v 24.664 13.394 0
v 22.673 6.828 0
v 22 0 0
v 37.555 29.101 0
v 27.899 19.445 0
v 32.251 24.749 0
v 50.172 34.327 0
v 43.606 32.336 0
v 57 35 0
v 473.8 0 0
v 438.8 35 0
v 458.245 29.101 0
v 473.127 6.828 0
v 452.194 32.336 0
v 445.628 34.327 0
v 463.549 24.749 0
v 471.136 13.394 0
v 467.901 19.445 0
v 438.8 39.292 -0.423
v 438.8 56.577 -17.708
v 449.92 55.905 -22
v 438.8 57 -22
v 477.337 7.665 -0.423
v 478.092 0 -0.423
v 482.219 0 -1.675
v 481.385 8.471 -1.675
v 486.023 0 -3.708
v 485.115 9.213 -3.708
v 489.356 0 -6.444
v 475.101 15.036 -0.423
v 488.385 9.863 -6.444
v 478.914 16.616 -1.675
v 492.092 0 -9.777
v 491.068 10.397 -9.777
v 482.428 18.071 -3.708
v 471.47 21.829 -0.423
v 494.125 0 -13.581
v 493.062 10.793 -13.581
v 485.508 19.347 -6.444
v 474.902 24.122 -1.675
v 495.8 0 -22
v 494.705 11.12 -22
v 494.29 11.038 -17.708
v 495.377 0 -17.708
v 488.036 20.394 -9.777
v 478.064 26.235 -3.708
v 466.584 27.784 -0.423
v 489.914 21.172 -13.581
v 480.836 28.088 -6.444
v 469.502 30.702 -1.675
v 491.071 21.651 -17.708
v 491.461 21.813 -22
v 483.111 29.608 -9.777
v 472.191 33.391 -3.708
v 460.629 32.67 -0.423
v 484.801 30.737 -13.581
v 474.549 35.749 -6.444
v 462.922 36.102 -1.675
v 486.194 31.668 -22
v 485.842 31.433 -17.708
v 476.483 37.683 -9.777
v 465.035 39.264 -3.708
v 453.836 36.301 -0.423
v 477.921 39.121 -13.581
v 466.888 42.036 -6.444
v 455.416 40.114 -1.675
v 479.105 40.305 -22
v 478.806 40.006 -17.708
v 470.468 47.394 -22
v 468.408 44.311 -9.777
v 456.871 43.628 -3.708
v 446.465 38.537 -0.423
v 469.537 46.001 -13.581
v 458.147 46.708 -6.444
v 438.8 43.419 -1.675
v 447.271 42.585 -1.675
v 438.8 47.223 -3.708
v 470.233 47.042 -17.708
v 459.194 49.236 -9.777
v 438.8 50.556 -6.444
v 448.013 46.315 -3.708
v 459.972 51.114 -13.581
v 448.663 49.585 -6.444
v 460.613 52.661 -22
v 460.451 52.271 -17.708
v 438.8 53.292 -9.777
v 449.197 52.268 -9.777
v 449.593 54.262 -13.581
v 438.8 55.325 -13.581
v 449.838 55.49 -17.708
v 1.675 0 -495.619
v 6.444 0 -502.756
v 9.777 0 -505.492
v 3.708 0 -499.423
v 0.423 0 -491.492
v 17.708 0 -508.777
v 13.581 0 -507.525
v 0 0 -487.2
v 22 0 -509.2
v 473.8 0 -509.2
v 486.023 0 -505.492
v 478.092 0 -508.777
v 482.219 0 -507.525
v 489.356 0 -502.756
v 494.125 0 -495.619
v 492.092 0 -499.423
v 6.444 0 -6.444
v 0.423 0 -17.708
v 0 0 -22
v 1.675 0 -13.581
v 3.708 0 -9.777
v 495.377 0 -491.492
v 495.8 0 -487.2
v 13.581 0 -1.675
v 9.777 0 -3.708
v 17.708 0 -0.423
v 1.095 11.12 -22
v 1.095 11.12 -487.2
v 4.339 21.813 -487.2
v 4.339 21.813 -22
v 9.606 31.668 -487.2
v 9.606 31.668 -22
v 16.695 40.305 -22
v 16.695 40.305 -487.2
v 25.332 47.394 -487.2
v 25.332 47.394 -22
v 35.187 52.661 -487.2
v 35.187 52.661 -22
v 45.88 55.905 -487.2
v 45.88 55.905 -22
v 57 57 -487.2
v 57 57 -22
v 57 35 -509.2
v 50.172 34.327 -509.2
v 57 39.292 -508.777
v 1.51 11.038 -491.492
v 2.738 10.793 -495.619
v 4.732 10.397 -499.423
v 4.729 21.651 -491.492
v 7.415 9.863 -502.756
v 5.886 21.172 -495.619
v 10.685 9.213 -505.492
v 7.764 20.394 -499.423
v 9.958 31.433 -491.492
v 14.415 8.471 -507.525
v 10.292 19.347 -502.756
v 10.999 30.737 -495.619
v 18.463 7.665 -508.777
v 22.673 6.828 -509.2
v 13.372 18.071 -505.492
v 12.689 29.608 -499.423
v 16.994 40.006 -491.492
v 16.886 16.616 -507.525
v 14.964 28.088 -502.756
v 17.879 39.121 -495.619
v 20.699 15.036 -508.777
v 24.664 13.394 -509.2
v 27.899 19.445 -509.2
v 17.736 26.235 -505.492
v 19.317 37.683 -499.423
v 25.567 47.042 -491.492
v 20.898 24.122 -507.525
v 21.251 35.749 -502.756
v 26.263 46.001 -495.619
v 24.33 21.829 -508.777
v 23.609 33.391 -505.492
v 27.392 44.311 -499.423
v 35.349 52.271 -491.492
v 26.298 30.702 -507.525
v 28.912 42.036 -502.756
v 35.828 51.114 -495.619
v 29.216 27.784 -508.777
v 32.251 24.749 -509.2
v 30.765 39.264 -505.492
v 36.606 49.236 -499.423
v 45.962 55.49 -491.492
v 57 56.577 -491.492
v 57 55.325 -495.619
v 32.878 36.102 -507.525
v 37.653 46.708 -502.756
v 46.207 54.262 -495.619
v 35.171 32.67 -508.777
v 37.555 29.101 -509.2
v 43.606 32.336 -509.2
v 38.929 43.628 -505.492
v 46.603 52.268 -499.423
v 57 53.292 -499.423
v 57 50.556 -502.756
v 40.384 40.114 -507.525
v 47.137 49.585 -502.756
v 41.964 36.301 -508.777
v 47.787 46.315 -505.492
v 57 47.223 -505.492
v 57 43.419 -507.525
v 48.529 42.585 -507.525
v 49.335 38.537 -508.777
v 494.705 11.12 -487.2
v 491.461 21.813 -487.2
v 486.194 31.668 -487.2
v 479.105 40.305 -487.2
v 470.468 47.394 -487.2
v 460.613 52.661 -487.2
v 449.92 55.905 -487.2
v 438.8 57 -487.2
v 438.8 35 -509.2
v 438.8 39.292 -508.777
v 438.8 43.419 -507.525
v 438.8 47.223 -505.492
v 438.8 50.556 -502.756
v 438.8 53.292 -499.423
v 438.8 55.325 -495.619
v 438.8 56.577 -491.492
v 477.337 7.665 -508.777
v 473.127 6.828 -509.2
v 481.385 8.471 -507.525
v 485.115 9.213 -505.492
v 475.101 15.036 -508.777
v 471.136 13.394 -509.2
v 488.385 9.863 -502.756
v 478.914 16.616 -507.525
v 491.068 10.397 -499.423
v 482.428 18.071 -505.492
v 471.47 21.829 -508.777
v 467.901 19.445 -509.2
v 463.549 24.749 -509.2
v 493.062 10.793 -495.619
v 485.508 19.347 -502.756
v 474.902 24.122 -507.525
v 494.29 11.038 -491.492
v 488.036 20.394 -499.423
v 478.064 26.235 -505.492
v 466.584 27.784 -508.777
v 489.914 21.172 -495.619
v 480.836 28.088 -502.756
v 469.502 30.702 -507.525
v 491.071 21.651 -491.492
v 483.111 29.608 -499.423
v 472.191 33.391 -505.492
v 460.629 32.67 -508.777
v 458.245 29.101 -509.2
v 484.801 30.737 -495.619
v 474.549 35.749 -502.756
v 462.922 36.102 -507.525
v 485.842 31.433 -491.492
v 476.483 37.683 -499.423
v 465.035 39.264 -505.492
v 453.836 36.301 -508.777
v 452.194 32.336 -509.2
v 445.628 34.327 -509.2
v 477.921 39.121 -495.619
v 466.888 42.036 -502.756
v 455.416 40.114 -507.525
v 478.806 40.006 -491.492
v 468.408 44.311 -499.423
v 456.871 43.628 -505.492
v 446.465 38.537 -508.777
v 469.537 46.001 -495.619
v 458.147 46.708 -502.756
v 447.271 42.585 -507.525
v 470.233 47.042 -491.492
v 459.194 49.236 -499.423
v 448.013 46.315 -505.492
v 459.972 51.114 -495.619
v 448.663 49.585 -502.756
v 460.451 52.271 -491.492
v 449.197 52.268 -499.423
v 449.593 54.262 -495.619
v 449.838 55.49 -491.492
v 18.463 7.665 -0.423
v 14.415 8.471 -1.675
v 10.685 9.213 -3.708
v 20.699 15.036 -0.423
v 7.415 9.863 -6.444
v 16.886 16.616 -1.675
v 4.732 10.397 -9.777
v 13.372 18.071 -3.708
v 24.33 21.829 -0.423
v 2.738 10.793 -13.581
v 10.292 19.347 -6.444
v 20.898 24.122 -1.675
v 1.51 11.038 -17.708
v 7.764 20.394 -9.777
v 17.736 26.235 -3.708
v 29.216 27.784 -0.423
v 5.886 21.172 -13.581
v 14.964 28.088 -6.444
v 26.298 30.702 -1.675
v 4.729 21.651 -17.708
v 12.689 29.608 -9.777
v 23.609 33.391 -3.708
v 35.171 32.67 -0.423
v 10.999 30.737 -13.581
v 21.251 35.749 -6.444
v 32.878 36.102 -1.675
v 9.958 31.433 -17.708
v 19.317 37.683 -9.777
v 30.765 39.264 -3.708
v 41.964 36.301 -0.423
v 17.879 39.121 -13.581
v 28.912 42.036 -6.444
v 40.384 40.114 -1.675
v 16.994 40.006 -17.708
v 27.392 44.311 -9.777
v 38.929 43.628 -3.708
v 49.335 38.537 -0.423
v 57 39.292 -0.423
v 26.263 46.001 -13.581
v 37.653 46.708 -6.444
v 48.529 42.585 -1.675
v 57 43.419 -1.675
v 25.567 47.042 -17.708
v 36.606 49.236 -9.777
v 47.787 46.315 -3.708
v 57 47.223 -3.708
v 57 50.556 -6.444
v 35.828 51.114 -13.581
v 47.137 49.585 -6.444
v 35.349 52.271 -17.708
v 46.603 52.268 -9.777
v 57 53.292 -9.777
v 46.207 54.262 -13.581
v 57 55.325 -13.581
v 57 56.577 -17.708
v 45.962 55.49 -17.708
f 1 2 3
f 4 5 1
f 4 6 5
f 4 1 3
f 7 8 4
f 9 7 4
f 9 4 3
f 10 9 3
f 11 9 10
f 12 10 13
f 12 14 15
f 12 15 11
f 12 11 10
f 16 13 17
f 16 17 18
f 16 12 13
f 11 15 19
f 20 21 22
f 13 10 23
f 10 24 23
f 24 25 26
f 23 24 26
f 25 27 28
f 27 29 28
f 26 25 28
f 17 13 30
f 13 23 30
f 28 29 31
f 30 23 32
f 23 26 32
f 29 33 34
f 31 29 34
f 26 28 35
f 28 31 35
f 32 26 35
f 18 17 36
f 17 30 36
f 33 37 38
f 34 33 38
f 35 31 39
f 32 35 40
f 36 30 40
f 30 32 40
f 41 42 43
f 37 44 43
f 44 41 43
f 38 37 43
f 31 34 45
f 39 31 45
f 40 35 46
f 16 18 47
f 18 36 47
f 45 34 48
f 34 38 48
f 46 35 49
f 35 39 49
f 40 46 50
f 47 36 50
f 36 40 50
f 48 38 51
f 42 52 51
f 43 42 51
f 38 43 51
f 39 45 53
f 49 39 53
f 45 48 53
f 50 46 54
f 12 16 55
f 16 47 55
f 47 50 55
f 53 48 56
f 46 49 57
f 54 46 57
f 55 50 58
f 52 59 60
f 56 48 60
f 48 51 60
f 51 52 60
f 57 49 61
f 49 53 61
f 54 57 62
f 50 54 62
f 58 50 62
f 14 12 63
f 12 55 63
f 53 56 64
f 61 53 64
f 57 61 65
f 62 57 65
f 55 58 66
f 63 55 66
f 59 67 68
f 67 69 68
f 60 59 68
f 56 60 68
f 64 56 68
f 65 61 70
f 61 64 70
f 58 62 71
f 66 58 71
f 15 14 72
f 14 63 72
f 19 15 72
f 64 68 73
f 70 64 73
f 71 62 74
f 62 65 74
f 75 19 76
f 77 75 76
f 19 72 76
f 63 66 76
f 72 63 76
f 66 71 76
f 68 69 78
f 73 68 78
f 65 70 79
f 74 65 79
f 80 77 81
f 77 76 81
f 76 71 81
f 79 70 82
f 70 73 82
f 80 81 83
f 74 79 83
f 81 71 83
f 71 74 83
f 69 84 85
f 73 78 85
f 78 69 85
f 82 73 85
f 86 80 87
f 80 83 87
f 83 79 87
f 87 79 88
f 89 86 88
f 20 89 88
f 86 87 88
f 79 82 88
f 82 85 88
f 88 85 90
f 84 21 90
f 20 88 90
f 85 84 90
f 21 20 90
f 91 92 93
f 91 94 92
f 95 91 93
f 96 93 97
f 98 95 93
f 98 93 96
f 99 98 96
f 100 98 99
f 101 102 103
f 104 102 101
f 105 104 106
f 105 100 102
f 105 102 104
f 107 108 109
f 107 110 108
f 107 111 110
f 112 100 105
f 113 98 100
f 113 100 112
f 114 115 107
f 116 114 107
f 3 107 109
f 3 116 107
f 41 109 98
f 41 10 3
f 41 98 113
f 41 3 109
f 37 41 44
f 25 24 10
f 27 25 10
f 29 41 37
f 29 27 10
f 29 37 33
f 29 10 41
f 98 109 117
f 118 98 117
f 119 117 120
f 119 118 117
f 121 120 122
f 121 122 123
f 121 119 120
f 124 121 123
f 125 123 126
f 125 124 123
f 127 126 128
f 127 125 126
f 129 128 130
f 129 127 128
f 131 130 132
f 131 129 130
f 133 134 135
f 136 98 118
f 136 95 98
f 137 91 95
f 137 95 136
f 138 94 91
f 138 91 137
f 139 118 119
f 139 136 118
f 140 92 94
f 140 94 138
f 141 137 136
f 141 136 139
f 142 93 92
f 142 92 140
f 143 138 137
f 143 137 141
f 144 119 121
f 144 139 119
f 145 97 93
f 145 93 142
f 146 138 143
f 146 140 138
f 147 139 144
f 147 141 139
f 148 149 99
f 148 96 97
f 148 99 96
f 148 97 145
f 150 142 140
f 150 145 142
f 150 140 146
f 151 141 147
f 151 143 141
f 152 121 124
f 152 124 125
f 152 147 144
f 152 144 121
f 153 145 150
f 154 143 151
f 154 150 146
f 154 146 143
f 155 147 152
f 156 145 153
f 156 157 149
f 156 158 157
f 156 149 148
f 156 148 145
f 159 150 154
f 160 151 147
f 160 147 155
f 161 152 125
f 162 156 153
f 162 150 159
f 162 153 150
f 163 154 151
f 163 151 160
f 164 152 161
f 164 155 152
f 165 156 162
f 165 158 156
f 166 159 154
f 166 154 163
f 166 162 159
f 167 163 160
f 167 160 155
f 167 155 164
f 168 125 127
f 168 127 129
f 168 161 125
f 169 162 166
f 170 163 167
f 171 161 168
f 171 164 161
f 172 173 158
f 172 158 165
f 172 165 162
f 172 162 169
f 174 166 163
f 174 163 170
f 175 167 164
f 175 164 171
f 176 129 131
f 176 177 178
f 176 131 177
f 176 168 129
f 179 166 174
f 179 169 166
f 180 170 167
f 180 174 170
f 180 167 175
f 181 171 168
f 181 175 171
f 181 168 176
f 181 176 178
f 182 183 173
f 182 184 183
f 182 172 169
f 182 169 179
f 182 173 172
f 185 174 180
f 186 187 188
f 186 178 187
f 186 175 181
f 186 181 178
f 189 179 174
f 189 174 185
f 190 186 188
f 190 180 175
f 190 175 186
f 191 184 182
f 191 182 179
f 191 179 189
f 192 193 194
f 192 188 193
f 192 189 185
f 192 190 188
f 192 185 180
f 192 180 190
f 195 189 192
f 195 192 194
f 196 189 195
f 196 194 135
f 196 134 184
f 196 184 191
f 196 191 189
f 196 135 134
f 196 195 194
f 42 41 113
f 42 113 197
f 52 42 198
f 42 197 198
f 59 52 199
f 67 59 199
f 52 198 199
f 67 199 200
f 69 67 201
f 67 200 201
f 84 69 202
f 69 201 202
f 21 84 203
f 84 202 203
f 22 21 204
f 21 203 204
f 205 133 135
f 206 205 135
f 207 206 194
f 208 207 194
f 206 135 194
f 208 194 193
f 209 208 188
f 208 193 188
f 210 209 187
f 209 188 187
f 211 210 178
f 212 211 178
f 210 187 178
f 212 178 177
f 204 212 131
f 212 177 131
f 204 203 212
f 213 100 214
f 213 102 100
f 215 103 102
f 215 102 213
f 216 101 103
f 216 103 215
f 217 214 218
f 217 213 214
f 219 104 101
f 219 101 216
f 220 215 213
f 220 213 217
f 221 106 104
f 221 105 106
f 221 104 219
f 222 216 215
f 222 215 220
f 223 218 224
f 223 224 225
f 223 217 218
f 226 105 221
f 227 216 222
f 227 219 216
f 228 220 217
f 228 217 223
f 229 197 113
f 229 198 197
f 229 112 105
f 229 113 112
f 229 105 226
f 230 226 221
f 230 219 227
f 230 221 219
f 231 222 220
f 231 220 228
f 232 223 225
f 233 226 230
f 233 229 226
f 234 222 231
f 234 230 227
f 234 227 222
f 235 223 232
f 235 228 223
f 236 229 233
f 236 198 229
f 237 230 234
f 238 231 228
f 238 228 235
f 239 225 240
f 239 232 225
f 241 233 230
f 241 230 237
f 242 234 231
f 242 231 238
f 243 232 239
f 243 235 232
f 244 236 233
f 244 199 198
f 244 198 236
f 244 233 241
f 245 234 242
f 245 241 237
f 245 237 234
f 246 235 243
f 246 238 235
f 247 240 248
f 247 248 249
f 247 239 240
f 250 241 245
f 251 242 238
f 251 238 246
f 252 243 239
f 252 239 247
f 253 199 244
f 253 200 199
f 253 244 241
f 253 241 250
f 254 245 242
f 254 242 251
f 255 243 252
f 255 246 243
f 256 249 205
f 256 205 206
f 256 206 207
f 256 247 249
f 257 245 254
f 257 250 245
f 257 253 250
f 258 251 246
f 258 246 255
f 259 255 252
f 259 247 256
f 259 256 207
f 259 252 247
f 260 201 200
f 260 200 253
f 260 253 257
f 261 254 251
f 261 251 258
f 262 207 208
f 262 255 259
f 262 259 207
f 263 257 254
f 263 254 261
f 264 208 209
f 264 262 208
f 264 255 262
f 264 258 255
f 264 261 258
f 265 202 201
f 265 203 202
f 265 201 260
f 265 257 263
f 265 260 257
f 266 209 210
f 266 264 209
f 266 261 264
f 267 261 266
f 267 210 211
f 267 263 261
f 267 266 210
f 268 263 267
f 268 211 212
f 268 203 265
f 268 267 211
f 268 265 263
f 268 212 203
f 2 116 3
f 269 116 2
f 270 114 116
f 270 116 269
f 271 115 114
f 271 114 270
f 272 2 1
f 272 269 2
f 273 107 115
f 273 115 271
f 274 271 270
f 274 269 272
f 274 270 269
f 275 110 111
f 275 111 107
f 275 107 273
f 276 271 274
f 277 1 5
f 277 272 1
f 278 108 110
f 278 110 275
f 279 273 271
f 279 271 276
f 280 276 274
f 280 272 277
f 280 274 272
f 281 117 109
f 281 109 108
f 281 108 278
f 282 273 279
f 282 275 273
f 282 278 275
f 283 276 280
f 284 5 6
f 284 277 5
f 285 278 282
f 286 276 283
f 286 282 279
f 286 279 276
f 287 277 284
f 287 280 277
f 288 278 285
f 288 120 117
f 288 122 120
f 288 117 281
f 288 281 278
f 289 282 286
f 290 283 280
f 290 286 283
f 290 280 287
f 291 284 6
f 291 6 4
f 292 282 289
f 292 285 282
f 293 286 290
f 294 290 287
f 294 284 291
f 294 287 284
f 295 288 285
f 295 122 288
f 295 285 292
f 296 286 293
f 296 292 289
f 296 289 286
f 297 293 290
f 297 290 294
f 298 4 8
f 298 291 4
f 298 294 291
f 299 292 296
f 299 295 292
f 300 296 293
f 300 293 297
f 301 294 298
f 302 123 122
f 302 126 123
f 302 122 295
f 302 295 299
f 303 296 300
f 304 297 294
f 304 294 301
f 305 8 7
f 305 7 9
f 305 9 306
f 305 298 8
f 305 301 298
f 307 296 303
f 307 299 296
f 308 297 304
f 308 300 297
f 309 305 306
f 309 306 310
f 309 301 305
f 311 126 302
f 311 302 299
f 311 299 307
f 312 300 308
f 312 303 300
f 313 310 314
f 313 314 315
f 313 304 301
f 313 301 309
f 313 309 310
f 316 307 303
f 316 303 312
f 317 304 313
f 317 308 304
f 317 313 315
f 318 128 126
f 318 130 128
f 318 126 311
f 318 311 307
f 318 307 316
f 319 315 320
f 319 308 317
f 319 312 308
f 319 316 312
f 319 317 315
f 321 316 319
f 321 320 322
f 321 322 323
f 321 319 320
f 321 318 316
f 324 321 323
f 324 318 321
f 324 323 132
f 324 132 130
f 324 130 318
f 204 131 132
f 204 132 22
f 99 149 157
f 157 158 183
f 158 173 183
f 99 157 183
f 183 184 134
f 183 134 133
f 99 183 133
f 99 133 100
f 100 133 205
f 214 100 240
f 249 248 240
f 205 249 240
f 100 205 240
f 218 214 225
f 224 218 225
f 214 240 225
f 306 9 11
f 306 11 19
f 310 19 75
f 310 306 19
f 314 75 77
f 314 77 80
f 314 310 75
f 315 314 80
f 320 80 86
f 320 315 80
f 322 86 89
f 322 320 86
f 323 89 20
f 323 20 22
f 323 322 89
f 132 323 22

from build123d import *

# Parameters (mm, degrees)
F0_W         = 495.8
F0_H         = 57
F1_DEPTH     = 509.2
F2_R         = 56.99999
F3_T1_DEPTH  = 381.80002
F3_T3_DEPTH  = 55.00001
F3_T6_ANGLE  = 90
F3_T8_ANGLE  = 90
F3_T10_ANGLE = 90
F3_T12_ANGLE = 90


# Not quite as in the source:
# - a fillet or chamfer that OpenCascade refuses, or shapes differently, is made with other operations: its cross-section is extruded or revolved along the edge and cut away or added
# - a fillet or chamfer is up to 0.001 mm smaller than in the source, because OpenCascade refuses the exact size


with BuildPart() as f1:
    # F0 (on Top) → F1 (new body)
    with BuildSketch(Plane.XY):
        with Locations((247.9, 28.5)):
            Rectangle(F0_W, F0_H)
    extrude(amount=-F1_DEPTH)

    # F2 (radius 57 in the source; OpenCascade refuses exactly that, so slightly less here)
    f2_edges = [f1.edges().sort_by_distance(p)[0] for p in [
        (495.8, 57, -254.6),
        (0, 57, -254.6),
    ]]
    fillet(f2_edges, radius=F2_R)

    # F3: fillet of radius 22 on 6 edges, made by hand

    # F3_s2 → F3_t1 (cut)
    with BuildSketch(Plane.YZ.offset(56.99999)):
        with BuildLine():
            ThreePointArc((35, 0), (50.5563491861, -6.4436508139), (57, -22))
            Line((57, -22), (57, 0))
            Line((57, 0), (35, 0))
        make_face()
        with BuildLine():
            ThreePointArc((35, -509.2), (50.5563491861, -502.7563491861), (57, -487.2))
            Line((57, -487.2), (57, -509.2))
            Line((57, -509.2), (35, -509.2))
        make_face()
    extrude(amount=F3_T1_DEPTH, mode=Mode.SUBTRACT)

    # F3_s4 → F3_t3 (cut)
    with BuildSketch(Plane.XZ.offset(-1e-05)):
        with BuildLine():
            ThreePointArc((473.8, -509.2), (489.3563491861, -502.7563491861), (495.8, -487.2))
            Line((495.8, -487.2), (495.8, -509.2))
            Line((495.8, -509.2), (473.8, -509.2))
        make_face()
        with BuildLine():
            ThreePointArc((0, -487.2), (6.4436508139, -502.7563491861), (22, -509.2))
            Line((22, -509.2), (0, -509.2))
            Line((0, -509.2), (0, -487.2))
        make_face()
        with BuildLine():
            ThreePointArc((0, -22), (6.4436508139, -6.4436508139), (22, 0))
            Line((22, 0), (0, 0))
            Line((0, 0), (0, -22))
        make_face()
        with BuildLine():
            ThreePointArc((473.8, 0), (489.3563491861, -6.4436508139), (495.8, -22))
            Line((495.8, -22), (495.8, 0))
            Line((495.8, 0), (473.8, 0))
        make_face()
    extrude(amount=F3_T3_DEPTH, mode=Mode.SUBTRACT)

    # F3_s5 → F3_t6 (revolve, cut)
    with BuildSketch(Plane.XZ.offset(-1e-05)):
        with BuildLine():
            ThreePointArc((473.8, 0), (489.3563491861, -6.4436508139), (495.8, -22))
            Line((495.8, -22), (495.8, 0))
            Line((495.8, 0), (473.8, 0))
        make_face()
    revolve(axis=Axis((438.80001, 1e-05, 0), (0, 0, 1)), revolution_arc=F3_T6_ANGLE, mode=Mode.SUBTRACT)

    # F3_s7 → F3_t8 (revolve, cut)
    with BuildSketch(Plane.XZ.offset(-1e-05)):
        with BuildLine():
            ThreePointArc((22, 0), (6.4436508139, -6.4436508139), (0, -22))
            Line((0, -22), (0, 0))
            Line((0, 0), (22, 0))
        make_face()
    revolve(axis=Axis((56.99999, 1e-05, 0), (0, 0, -1)), revolution_arc=F3_T8_ANGLE, mode=Mode.SUBTRACT)

    # F3_s9 → F3_t10 (revolve, cut)
    with BuildSketch(Plane.XZ.offset(-1e-05)):
        with BuildLine():
            ThreePointArc((0, -487.2), (6.4436508139, -502.7563491861), (22, -509.2))
            Line((22, -509.2), (0, -509.2))
            Line((0, -509.2), (0, -487.2))
        make_face()
    revolve(axis=Axis((56.99999, 1e-05, -509.2), (0, 0, -1)), revolution_arc=F3_T10_ANGLE, mode=Mode.SUBTRACT)

    # F3_s11 → F3_t12 (revolve, cut)
    with BuildSketch(Plane.XZ.offset(-1e-05)):
        with BuildLine():
            ThreePointArc((473.8, -509.2), (489.3563491861, -502.7563491861), (495.8, -487.2))
            Line((495.8, -487.2), (495.8, -509.2))
            Line((495.8, -509.2), (473.8, -509.2))
        make_face()
    revolve(axis=Axis((438.80001, 1e-05, -509.2), (0, 0, 1)), revolution_arc=F3_T12_ANGLE, mode=Mode.SUBTRACT)


solid = f1.part
